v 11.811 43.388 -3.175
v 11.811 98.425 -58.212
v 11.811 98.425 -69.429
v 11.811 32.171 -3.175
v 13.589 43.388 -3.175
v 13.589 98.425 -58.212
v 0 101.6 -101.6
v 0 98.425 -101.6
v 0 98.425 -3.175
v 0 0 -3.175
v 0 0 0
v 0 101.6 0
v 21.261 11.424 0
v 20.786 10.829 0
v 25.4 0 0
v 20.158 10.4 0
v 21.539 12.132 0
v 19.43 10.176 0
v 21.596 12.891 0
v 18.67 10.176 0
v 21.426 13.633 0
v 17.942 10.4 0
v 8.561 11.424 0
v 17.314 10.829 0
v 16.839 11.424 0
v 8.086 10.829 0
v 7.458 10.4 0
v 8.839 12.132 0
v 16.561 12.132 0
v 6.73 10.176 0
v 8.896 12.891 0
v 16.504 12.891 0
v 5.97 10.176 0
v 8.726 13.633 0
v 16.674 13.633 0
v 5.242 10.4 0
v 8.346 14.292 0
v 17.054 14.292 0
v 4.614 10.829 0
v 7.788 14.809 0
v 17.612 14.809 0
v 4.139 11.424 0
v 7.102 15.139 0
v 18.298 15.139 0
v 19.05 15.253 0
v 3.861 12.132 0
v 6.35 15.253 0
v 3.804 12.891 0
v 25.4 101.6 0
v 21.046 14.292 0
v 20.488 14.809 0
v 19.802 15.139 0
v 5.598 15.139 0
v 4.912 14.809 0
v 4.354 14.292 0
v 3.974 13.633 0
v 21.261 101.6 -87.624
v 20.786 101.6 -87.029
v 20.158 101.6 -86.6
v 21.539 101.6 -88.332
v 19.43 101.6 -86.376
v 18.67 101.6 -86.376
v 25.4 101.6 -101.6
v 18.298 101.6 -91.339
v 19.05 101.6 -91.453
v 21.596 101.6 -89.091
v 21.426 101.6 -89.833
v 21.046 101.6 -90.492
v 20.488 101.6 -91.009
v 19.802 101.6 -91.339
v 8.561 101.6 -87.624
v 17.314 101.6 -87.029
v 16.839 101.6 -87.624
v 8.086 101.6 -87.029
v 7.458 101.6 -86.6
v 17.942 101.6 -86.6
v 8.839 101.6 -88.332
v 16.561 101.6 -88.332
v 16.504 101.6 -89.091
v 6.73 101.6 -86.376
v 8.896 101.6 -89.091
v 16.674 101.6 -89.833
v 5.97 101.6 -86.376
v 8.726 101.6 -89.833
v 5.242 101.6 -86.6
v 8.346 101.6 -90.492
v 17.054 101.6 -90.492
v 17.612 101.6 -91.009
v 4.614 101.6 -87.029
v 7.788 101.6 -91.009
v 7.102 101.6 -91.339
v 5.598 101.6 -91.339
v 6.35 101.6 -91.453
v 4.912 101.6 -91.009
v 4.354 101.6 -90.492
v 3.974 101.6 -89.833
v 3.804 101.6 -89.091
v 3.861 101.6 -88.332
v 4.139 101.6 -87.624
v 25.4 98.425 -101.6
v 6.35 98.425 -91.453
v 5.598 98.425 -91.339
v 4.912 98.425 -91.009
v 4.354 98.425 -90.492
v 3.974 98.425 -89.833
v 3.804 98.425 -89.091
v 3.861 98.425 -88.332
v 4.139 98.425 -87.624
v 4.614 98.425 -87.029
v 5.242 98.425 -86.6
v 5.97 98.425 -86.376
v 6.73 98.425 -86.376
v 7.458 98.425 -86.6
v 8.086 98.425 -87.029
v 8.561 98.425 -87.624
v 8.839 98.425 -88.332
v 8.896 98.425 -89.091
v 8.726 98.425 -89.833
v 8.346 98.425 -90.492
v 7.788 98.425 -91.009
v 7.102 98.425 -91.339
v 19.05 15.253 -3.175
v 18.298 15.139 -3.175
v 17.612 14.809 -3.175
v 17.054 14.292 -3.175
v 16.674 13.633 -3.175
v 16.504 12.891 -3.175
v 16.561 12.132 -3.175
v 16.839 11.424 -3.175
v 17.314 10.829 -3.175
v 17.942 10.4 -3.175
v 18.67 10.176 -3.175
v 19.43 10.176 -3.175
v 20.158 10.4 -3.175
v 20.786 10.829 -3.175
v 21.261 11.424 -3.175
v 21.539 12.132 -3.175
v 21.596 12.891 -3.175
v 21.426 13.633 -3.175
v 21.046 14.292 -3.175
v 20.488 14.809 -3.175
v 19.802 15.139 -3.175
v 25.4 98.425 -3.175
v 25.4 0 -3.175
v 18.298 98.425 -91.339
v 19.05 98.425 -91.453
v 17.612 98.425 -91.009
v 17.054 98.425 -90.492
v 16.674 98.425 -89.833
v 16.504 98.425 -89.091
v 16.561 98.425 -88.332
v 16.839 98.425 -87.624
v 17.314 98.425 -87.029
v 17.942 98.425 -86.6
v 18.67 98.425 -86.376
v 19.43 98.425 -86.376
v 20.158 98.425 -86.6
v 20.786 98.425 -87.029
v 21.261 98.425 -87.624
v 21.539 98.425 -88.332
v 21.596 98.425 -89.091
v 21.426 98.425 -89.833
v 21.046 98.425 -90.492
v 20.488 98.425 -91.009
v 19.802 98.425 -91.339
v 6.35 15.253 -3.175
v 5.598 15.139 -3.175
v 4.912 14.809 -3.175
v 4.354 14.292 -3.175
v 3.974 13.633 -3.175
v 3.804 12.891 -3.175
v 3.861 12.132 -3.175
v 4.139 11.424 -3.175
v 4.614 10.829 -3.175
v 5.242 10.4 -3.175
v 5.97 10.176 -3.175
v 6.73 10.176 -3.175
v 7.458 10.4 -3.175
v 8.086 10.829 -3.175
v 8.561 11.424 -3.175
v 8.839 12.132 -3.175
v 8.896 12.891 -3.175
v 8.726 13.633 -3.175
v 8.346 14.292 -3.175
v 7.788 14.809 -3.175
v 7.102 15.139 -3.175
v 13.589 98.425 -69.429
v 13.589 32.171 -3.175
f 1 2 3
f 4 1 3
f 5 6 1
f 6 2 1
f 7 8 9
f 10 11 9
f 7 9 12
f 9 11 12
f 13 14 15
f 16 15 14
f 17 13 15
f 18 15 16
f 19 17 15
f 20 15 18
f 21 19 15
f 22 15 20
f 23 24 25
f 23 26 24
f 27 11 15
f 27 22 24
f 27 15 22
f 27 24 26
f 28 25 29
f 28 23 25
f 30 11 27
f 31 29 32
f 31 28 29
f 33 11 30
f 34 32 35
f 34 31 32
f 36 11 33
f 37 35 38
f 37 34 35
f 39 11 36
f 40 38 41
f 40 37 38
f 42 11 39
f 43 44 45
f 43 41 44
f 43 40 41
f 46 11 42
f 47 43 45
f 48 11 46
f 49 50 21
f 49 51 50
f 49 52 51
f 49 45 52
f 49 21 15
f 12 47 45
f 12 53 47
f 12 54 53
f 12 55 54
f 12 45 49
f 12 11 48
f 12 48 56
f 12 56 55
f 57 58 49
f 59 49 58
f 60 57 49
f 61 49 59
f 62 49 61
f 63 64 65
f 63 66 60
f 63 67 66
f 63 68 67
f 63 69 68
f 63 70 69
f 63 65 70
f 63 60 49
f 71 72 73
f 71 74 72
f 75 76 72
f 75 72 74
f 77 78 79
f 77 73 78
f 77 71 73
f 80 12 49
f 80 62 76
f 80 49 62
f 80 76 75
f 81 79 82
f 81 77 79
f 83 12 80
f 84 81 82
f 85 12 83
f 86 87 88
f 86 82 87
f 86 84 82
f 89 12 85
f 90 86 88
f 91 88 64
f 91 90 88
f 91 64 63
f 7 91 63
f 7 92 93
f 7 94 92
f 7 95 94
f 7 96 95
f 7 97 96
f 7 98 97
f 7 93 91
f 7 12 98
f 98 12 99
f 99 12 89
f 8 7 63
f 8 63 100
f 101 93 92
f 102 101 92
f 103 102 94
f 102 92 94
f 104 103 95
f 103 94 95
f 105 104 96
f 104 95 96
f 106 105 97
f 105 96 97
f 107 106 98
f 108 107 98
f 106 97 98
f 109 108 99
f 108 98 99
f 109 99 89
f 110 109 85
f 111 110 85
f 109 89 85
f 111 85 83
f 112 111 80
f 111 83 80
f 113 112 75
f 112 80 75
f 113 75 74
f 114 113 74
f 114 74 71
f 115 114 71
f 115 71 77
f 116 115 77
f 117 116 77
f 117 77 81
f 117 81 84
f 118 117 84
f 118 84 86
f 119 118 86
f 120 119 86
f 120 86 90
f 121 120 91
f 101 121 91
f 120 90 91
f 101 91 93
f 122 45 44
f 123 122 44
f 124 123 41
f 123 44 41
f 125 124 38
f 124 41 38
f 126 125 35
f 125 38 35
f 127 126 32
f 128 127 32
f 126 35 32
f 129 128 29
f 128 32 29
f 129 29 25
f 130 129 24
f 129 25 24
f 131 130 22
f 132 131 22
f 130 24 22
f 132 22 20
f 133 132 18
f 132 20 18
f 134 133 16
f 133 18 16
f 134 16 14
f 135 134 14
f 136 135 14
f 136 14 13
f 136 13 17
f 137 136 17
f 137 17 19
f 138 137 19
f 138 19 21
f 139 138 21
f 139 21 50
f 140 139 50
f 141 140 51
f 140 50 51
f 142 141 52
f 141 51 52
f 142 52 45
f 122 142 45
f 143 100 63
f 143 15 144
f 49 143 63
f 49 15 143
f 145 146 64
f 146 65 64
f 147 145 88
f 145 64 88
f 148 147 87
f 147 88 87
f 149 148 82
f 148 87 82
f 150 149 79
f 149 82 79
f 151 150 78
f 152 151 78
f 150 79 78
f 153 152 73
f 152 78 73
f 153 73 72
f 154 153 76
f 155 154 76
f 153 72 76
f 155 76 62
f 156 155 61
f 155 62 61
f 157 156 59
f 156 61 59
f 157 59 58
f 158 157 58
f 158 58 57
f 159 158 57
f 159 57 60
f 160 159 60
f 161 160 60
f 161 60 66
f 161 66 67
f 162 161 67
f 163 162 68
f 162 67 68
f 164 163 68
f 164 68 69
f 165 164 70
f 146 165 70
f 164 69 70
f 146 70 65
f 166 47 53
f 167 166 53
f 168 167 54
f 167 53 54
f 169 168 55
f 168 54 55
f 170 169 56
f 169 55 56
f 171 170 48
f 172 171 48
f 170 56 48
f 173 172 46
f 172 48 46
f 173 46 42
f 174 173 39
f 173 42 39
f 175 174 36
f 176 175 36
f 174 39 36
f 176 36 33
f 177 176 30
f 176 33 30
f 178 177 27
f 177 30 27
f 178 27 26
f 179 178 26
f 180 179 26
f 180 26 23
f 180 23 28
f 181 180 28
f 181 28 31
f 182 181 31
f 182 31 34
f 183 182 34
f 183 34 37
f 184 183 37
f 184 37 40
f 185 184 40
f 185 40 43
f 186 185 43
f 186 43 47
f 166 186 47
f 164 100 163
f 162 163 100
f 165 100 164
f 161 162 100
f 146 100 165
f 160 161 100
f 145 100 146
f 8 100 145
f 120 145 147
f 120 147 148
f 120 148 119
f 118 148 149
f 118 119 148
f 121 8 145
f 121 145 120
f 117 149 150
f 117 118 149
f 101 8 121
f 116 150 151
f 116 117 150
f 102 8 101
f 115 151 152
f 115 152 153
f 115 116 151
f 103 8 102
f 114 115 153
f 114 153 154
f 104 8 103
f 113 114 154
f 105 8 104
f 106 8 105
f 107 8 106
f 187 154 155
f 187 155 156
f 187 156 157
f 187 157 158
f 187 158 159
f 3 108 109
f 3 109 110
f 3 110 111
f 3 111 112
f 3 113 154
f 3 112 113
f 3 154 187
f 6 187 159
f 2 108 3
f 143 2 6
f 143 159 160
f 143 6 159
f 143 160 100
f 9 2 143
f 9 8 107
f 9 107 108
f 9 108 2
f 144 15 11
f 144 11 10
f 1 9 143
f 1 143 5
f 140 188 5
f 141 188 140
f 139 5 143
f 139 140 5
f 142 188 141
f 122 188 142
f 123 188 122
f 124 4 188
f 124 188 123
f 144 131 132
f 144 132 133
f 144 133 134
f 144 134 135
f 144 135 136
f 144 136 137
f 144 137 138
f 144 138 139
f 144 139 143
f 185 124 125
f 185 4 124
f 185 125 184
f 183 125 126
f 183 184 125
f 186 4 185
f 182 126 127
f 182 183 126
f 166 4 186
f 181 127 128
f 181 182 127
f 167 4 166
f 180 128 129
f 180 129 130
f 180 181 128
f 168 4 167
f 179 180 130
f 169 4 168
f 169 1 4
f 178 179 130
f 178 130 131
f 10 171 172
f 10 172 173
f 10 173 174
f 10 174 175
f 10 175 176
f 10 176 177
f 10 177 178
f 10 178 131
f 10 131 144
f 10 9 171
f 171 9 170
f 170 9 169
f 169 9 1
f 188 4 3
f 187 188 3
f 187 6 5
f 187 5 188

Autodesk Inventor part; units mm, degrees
ref_plane "YZ Plane" through (0, 0, 0) normal (1, 0, 0) x (0, 1, 0)
ref_plane "XZ Plane" through (0, 0, 0) normal (0, 1, 0) x (-1, 0, 0)
sketch "Sketch1" plane through (0, 0, 0) normal (1, 0, 0) x (0, 1, 0)
  line L0 (0, 0) -> (101.6, 0)
  line L1 (101.6, 0) -> (101.6, -101.6)
  line L2 (98.425, -101.6) -> (98.425, -3.175)
  line L3 (98.425, -3.175) -> (0, -3.175)
  line L4 (101.6, -101.6) -> (98.425, -101.6)
  line L5 (0, 0) -> (0, -3.175)
  dimension "d0" = 101.6
  dimension "d1" = 101.6
  dimension "d2" = 3.175
extrude "Extrusion1" add sketch "Sketch1" along normal blind 25.4
ref_plane "Work Plane1" through (12.7, 0, 0) normal (1, 0, 0) x (0, 0, -1)
sketch "Sketch2" plane through (12.7, 0, 0) normal (1, 0, 0) x (0, 0, -1)
  line L0 (2.312, 31.3076) -> (70.5907, 99.5863)
  line L1 (2.312, 31.3076) -> (98.8727, 31.3076) construction
  line L2 (59.3736, 99.5863) -> (2.312, 42.5247)
  line L3 (70.5907, 99.5863) -> (59.3736, 99.5863)
  line L4 (2.312, 31.3076) -> (2.312, 42.5247)
  point P0 (0, 0)
  dimension "d6" = 45
  dimension "d7" = 7.9317
extrude "Extrusion2" add sketch "Sketch2" along normal mid plane 1.778
sketch "Sketch4" plane through (0, 98.425, -101.6) normal (0, -1, 0) x (1, 0, 0)
  line L0 (0, 0) -> (0, 98.425) projected
  line L1 (0, 0) -> (25.4, 0) projected
  circle A0 centre (6.35, 12.7) radius 2.2746
  circle A1 centre (19.05, 12.7) radius 2.2746
  point P0 (0, 101.6)
  dimension "d10" = 12.7
  dimension "d11" = 6.35
  dimension "d14" = 12.7
hole "Hole1" at (19.05, 98.425, -88.9) at (6.35, 98.425, -88.9) direction (0, 1, 0) diameter 5.1054 depth 25.4 tip angle 118 clearance for "Flat Head Machine Screw (82)" size "#10" standard "Ansi Unified Screw Threads"
sketch "Sketch5" plane through (0, 0, -3.175) normal (0, 0, -1) x (-1, 0, 0)
  line L0 (-25.4, 0) -> (-25.4, 98.425) projected
  line L1 (0, 0) -> (-25.4, 0) projected
  circle A0 centre (-19.05, 12.7) radius 2.2861
  circle A1 centre (-6.35, 12.7) radius 2.2861
  dimension "d26" = 12.7
  dimension "d27" = 6.35
  dimension "d30" = 12.7
hole "Hole2" at (19.05, 12.7, -3.175) at (6.35, 12.7, -3.175) direction (0, 0, 1) diameter 5.1054 depth 25.4 tip angle 118 clearance for "Flat Head Machine Screw (82)" size "#10" standard "Ansi Unified Screw Threads"
equation "\"d11\" = 0.25 * d3"
equation "\"d14\" = 0.5 * d3"
equation "\"d27\" = 0.25 * d3"
equation "\"d30\" = 0.5 * d3"
equation "\"d5\" = -0.5 * d3"
equation "\"d3\" = 25.4"
properties part number "angleBracket"
